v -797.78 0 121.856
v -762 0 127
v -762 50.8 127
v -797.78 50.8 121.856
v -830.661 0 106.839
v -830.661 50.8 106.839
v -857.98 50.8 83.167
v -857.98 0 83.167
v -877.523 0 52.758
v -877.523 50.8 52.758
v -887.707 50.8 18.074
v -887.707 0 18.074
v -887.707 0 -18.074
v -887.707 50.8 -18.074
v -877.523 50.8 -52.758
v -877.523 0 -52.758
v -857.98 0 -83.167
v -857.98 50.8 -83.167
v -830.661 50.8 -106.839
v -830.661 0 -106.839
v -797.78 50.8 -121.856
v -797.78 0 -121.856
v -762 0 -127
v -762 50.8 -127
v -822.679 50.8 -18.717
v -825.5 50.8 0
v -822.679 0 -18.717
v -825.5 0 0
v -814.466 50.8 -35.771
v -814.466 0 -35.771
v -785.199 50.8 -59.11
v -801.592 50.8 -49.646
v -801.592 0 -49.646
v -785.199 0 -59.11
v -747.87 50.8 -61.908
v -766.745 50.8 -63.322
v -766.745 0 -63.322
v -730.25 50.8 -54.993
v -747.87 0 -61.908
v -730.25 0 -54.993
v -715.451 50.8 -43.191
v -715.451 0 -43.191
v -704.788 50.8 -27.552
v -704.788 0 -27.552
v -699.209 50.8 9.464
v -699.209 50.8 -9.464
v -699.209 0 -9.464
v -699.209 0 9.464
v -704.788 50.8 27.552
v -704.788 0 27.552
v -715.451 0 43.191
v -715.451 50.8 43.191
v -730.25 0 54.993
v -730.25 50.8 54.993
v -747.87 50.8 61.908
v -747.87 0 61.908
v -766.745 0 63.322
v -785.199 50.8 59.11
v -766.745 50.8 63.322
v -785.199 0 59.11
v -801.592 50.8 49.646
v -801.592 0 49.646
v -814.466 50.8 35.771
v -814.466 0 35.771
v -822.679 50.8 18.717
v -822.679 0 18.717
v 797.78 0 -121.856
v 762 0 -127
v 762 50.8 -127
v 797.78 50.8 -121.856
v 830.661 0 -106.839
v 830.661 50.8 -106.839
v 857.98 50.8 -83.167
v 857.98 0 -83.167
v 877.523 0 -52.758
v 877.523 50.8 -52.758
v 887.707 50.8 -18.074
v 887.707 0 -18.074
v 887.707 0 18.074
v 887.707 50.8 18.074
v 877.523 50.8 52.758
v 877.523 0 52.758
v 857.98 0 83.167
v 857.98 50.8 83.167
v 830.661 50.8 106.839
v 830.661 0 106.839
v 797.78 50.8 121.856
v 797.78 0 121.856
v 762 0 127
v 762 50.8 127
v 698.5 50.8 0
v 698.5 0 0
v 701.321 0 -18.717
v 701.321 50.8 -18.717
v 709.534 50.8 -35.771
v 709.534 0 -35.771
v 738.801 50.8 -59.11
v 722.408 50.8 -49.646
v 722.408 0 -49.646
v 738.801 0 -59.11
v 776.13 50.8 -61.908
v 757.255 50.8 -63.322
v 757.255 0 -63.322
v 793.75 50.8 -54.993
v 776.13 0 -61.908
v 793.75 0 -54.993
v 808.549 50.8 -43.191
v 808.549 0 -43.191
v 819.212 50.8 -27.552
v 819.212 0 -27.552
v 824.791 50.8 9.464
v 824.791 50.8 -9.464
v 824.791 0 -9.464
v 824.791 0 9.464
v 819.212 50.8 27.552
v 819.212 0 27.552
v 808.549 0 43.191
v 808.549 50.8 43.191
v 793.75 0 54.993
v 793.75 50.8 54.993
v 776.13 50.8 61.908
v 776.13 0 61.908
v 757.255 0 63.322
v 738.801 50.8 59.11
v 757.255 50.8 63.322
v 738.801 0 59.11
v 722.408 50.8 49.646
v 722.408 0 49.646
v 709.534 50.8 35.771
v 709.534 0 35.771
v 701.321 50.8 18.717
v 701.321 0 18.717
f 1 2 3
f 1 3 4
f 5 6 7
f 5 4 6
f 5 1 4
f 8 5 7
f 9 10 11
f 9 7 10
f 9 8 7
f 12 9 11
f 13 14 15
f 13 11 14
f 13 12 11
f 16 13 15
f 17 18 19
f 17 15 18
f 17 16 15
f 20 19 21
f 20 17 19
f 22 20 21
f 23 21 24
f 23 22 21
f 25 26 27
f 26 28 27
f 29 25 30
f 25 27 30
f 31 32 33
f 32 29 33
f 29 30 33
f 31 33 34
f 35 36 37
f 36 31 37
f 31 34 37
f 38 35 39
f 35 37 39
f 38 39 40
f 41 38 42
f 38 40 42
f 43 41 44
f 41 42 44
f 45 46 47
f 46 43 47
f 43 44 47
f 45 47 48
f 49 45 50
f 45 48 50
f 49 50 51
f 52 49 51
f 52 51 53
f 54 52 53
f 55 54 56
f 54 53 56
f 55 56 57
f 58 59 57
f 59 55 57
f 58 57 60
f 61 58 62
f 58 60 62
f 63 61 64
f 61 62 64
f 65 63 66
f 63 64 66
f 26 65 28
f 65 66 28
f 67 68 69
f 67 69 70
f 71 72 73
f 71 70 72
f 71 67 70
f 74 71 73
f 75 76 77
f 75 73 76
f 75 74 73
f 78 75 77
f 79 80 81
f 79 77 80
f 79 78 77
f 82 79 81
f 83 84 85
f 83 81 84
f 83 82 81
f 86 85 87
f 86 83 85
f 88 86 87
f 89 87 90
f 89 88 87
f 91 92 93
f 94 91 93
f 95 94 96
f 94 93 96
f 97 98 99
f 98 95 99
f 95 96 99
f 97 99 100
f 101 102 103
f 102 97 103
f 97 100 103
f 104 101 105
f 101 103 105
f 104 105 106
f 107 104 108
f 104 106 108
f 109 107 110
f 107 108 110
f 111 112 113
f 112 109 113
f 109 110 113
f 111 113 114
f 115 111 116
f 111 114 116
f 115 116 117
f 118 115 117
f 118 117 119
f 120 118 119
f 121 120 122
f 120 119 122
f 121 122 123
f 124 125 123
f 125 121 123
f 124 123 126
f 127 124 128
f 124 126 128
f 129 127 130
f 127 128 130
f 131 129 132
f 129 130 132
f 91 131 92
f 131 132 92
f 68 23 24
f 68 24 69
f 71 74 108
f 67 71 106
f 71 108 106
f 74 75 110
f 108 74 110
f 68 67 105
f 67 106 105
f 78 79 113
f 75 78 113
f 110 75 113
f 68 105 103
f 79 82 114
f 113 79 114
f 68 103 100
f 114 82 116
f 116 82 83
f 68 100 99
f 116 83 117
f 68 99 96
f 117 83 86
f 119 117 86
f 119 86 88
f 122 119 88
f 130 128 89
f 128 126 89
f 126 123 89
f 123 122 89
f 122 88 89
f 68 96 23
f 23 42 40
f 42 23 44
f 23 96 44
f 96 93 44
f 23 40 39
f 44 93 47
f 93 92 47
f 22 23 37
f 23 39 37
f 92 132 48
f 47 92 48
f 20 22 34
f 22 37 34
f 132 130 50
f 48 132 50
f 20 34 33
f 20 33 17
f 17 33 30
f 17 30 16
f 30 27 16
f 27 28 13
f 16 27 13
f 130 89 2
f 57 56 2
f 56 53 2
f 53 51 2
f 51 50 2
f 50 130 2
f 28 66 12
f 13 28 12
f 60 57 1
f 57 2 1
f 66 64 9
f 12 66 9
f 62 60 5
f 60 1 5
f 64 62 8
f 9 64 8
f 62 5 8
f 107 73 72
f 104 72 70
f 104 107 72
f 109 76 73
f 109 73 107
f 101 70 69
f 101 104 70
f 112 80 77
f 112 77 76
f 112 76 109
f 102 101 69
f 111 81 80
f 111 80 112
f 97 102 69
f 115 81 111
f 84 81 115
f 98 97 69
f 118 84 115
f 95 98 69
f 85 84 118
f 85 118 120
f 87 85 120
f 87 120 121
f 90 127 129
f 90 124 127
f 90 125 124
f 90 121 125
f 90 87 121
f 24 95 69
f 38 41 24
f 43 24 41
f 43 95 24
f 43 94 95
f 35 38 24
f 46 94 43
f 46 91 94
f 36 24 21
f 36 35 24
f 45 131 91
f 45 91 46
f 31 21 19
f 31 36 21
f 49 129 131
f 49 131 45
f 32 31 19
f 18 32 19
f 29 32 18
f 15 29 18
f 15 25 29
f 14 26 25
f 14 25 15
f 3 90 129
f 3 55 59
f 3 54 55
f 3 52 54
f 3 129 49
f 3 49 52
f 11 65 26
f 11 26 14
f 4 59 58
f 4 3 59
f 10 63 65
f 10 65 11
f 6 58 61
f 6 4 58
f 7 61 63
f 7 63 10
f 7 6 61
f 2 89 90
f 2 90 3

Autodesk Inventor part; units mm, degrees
ref_plane "YZ Plane" through (0, 0, 0) normal (1, 0, 0) x (0, 1, 0)
ref_plane "XZ Plane" through (0, 0, 0) normal (0, 1, 0) x (-1, 0, 0)
ref_plane "XY Plane" through (0, 0, 0) normal (0, 0, 1) x (1, 0, 0)
sketch "Sketch1" plane through (0, 0, 0) normal (0, 1, 0) x (-1, 0, 0)
  line L0 (-762, 127) -> (762, 127)
  line L1 (762, 127) -> (762, -127) construction
  line L2 (762, -127) -> (-762, -127)
  line L3 (-762, -127) -> (-762, 127) construction
  line L4 (-762, 127) -> (762, -127) construction
  line L5 (762, 127) -> (-762, -127) construction
  arc A0 (762, -127) -> (762, 127) centre (762, 0) ccw
  arc A1 (-762, 127) -> (-762, -127) centre (-762, 0) ccw
  circle A2 centre (762, 0) radius 63.5
  circle A3 centre (-762, 0) radius 63.5
  point P0 (0, 0)
  dimension "d0" = 1524
  dimension "d1" = 254
  dimension "d2" = 127
  dimension "d3" = 127
extrude "Extrusion1" add sketch "Sketch1" along normal blind 50.8
properties part number "Output"
